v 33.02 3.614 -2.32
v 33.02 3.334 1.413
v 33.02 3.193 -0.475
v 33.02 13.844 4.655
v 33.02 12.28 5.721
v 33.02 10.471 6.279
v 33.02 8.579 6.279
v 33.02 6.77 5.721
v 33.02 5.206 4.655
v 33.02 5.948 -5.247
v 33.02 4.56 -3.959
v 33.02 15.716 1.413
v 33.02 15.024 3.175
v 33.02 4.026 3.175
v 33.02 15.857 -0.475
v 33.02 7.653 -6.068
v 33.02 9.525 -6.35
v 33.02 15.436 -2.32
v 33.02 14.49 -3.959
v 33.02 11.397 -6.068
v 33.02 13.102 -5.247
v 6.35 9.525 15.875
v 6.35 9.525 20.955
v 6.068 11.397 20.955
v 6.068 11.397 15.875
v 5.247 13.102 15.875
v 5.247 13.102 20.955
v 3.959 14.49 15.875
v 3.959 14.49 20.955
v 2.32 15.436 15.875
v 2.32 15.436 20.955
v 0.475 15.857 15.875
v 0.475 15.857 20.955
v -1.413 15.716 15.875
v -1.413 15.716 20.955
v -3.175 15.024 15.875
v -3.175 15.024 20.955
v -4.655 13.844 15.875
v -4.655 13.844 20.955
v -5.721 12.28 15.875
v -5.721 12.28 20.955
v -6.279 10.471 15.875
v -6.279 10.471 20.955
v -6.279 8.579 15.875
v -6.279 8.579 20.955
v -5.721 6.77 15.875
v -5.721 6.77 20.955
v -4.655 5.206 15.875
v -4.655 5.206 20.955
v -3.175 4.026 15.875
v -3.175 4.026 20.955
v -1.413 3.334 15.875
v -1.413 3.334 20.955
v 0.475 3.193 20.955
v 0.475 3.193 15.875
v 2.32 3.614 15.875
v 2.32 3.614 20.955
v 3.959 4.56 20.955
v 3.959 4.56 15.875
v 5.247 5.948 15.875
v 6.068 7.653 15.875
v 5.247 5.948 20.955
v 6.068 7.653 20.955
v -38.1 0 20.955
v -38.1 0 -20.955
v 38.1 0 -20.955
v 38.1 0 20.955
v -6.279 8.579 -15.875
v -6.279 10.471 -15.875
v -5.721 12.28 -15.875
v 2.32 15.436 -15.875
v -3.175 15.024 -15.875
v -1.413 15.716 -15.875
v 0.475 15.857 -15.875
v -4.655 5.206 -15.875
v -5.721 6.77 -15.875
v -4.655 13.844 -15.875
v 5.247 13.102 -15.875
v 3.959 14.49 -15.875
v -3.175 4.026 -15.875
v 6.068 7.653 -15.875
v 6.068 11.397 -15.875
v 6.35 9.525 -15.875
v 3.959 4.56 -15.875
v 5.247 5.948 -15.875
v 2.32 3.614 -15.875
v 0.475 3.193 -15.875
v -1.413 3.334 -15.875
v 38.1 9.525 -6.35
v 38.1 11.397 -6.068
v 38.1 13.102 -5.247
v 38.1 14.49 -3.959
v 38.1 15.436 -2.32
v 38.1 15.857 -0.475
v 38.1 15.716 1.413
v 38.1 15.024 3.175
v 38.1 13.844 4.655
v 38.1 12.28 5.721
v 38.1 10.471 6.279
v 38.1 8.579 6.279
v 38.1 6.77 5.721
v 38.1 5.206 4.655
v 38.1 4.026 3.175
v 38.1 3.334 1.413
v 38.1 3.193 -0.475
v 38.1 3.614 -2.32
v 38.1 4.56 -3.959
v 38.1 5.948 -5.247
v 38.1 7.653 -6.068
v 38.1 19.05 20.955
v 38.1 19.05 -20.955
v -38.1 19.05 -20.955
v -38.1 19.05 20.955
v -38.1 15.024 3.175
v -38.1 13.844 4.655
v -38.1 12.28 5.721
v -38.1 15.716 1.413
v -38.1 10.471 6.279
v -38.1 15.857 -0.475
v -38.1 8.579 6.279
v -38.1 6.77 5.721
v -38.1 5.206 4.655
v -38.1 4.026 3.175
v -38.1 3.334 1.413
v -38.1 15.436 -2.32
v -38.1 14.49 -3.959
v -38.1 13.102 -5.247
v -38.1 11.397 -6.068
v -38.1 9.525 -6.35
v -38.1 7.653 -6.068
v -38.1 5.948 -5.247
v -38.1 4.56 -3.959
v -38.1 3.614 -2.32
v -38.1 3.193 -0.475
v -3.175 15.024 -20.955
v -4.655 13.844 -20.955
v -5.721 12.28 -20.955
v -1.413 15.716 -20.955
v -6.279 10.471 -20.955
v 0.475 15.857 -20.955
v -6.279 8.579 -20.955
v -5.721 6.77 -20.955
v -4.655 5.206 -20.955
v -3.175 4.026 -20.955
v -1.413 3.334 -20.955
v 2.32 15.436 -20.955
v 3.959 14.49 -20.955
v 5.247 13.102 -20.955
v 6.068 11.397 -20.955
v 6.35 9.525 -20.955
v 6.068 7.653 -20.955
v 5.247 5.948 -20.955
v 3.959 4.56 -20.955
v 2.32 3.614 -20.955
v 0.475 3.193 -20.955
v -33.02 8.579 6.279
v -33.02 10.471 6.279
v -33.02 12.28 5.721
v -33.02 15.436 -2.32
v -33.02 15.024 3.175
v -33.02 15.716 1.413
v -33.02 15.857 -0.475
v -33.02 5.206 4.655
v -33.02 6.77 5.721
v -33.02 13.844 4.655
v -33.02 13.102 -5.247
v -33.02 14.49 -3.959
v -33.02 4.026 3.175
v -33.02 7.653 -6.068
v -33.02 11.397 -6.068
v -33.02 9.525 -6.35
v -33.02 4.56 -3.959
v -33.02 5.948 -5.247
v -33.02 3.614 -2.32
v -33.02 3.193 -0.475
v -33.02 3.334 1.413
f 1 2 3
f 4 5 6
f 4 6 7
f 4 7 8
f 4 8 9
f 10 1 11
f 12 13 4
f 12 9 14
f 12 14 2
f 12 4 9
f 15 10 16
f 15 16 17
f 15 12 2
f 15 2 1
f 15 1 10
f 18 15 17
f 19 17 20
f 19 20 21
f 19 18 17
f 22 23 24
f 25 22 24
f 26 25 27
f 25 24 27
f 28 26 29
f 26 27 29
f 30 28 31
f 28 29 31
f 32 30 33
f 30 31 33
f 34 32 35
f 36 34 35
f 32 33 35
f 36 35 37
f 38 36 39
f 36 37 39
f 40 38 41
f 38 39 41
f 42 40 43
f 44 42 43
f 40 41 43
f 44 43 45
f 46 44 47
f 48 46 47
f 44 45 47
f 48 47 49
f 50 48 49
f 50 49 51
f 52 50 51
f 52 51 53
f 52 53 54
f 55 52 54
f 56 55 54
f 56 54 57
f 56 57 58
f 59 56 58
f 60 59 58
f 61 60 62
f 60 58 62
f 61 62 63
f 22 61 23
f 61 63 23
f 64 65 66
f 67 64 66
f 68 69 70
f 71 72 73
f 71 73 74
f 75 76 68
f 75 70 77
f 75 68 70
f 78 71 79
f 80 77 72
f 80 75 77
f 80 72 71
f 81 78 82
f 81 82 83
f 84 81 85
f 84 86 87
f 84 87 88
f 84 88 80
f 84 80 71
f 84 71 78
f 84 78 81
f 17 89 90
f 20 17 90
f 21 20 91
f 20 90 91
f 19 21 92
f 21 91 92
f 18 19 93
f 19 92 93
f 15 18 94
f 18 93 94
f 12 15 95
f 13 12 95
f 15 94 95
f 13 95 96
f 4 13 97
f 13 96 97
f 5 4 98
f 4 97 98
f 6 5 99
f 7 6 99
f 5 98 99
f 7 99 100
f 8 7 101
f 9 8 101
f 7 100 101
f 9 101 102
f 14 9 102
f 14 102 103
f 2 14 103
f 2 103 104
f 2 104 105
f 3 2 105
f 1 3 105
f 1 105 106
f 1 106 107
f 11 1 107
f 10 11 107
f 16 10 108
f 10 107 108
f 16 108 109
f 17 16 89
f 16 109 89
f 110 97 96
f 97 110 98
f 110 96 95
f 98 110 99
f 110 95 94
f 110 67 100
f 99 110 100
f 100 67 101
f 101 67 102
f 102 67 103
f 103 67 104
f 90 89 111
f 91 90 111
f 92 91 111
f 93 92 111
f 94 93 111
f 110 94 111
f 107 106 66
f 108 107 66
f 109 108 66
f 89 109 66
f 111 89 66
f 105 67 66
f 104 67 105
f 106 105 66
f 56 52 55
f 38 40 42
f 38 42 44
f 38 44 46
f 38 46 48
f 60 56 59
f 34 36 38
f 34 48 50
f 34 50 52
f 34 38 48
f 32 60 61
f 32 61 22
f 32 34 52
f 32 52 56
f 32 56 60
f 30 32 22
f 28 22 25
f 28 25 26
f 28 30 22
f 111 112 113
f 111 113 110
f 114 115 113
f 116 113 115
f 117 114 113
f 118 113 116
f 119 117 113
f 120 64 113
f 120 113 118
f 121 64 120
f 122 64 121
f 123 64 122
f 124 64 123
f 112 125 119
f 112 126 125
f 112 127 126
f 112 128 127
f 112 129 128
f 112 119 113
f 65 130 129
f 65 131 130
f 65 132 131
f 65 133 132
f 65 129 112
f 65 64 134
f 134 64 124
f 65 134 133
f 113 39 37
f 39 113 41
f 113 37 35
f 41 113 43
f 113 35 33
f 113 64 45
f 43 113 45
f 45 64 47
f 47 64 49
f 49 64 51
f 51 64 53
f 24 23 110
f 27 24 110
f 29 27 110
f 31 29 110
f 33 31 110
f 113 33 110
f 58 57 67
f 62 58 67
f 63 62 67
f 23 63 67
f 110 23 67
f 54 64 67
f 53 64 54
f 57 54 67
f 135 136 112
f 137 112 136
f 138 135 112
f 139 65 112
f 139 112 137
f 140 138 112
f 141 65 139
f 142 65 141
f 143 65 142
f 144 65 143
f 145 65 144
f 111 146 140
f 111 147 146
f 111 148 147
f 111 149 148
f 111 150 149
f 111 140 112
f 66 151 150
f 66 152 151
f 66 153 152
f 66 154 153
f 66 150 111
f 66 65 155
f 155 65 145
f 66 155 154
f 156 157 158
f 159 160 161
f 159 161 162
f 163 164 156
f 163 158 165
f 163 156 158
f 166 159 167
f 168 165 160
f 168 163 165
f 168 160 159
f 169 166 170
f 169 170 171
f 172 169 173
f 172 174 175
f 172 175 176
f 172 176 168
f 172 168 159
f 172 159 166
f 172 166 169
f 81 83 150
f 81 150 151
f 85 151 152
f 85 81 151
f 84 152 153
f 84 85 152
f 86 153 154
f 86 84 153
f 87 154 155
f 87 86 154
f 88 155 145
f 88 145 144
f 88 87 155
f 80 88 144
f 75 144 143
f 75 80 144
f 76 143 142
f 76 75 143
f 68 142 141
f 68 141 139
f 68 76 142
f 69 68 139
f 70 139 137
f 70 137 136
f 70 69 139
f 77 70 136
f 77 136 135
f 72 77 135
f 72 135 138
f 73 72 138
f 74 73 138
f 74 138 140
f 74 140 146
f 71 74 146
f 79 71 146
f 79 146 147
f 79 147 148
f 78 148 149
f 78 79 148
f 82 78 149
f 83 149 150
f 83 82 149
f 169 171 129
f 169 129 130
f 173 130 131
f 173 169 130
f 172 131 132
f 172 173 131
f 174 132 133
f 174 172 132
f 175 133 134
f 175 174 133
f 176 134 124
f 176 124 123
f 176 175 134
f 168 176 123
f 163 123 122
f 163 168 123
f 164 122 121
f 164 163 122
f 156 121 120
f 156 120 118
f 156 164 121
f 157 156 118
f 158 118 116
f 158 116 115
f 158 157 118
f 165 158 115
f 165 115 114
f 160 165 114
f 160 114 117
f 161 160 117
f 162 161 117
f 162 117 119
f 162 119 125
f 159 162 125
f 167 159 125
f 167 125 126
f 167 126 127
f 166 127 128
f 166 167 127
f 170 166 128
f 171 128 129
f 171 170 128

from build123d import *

# Parameters (mm, degrees)
SKETCH1_W           = 76.2
SKETCH1_H           = 41.91
BOSS_EXTRUDE1_DEPTH = 19.05
SKETCH5_R           = 6.35
CUT_EXTRUDE1_DEPTH  = 5.08
SKETCH2_R           = 6.35
CUT_EXTRUDE2_DEPTH  = 5.08
CUT_EXTRUDE3_START  = -5.08
SKETCH3_R           = 6.35
CUT_EXTRUDE3_DEPTH  = 5.08
CUT_EXTRUDE4_START  = -5.08
SKETCH4_R           = 6.35
CUT_EXTRUDE4_DEPTH  = 5.08


with BuildPart() as part:
    # Sketch1 → Boss-Extrude1 (new body)
    with BuildSketch(Plane(origin=(0, 0, 0), x_dir=(1, 0, 0), z_dir=(0, 1, 0))):
        Rectangle(SKETCH1_W, SKETCH1_H)
    extrude(amount=BOSS_EXTRUDE1_DEPTH)

    # Sketch5 → Cut-Extrude1 (cut)
    with BuildSketch(Plane(origin=(38.1, 0, 0), x_dir=(0, 0, -1), z_dir=(1, 0, 0))):
        with Locations((0, 9.525)):
            Circle(SKETCH5_R)
    extrude(amount=-CUT_EXTRUDE1_DEPTH, mode=Mode.SUBTRACT)

    # Sketch2 → Cut-Extrude2 (cut)
    with BuildSketch(Plane.XY.offset(20.955)):
        with Locations((0, 9.525)):
            Circle(SKETCH2_R)
    extrude(amount=-CUT_EXTRUDE2_DEPTH, mode=Mode.SUBTRACT)

    # Sketch3 → Cut-Extrude3 (cut)
    with BuildSketch(Plane(origin=(0, 0, -20.955), x_dir=(-1, 0, 0), z_dir=(0, 0, -1)).offset(CUT_EXTRUDE3_START)):
        with Locations(Location((0, 9.525, 0), (0, 0, 180))):
            Circle(SKETCH3_R)
    extrude(amount=CUT_EXTRUDE3_DEPTH, mode=Mode.SUBTRACT)

    # Sketch4 → Cut-Extrude4 (cut)
    with BuildSketch(Plane.ZY.offset(38.1).offset(CUT_EXTRUDE4_START)):
        with Locations(Location((0, 9.525, 0), (0, 0, 180))):
            Circle(SKETCH4_R)
    extrude(amount=CUT_EXTRUDE4_DEPTH, mode=Mode.SUBTRACT)


solid = part.part
